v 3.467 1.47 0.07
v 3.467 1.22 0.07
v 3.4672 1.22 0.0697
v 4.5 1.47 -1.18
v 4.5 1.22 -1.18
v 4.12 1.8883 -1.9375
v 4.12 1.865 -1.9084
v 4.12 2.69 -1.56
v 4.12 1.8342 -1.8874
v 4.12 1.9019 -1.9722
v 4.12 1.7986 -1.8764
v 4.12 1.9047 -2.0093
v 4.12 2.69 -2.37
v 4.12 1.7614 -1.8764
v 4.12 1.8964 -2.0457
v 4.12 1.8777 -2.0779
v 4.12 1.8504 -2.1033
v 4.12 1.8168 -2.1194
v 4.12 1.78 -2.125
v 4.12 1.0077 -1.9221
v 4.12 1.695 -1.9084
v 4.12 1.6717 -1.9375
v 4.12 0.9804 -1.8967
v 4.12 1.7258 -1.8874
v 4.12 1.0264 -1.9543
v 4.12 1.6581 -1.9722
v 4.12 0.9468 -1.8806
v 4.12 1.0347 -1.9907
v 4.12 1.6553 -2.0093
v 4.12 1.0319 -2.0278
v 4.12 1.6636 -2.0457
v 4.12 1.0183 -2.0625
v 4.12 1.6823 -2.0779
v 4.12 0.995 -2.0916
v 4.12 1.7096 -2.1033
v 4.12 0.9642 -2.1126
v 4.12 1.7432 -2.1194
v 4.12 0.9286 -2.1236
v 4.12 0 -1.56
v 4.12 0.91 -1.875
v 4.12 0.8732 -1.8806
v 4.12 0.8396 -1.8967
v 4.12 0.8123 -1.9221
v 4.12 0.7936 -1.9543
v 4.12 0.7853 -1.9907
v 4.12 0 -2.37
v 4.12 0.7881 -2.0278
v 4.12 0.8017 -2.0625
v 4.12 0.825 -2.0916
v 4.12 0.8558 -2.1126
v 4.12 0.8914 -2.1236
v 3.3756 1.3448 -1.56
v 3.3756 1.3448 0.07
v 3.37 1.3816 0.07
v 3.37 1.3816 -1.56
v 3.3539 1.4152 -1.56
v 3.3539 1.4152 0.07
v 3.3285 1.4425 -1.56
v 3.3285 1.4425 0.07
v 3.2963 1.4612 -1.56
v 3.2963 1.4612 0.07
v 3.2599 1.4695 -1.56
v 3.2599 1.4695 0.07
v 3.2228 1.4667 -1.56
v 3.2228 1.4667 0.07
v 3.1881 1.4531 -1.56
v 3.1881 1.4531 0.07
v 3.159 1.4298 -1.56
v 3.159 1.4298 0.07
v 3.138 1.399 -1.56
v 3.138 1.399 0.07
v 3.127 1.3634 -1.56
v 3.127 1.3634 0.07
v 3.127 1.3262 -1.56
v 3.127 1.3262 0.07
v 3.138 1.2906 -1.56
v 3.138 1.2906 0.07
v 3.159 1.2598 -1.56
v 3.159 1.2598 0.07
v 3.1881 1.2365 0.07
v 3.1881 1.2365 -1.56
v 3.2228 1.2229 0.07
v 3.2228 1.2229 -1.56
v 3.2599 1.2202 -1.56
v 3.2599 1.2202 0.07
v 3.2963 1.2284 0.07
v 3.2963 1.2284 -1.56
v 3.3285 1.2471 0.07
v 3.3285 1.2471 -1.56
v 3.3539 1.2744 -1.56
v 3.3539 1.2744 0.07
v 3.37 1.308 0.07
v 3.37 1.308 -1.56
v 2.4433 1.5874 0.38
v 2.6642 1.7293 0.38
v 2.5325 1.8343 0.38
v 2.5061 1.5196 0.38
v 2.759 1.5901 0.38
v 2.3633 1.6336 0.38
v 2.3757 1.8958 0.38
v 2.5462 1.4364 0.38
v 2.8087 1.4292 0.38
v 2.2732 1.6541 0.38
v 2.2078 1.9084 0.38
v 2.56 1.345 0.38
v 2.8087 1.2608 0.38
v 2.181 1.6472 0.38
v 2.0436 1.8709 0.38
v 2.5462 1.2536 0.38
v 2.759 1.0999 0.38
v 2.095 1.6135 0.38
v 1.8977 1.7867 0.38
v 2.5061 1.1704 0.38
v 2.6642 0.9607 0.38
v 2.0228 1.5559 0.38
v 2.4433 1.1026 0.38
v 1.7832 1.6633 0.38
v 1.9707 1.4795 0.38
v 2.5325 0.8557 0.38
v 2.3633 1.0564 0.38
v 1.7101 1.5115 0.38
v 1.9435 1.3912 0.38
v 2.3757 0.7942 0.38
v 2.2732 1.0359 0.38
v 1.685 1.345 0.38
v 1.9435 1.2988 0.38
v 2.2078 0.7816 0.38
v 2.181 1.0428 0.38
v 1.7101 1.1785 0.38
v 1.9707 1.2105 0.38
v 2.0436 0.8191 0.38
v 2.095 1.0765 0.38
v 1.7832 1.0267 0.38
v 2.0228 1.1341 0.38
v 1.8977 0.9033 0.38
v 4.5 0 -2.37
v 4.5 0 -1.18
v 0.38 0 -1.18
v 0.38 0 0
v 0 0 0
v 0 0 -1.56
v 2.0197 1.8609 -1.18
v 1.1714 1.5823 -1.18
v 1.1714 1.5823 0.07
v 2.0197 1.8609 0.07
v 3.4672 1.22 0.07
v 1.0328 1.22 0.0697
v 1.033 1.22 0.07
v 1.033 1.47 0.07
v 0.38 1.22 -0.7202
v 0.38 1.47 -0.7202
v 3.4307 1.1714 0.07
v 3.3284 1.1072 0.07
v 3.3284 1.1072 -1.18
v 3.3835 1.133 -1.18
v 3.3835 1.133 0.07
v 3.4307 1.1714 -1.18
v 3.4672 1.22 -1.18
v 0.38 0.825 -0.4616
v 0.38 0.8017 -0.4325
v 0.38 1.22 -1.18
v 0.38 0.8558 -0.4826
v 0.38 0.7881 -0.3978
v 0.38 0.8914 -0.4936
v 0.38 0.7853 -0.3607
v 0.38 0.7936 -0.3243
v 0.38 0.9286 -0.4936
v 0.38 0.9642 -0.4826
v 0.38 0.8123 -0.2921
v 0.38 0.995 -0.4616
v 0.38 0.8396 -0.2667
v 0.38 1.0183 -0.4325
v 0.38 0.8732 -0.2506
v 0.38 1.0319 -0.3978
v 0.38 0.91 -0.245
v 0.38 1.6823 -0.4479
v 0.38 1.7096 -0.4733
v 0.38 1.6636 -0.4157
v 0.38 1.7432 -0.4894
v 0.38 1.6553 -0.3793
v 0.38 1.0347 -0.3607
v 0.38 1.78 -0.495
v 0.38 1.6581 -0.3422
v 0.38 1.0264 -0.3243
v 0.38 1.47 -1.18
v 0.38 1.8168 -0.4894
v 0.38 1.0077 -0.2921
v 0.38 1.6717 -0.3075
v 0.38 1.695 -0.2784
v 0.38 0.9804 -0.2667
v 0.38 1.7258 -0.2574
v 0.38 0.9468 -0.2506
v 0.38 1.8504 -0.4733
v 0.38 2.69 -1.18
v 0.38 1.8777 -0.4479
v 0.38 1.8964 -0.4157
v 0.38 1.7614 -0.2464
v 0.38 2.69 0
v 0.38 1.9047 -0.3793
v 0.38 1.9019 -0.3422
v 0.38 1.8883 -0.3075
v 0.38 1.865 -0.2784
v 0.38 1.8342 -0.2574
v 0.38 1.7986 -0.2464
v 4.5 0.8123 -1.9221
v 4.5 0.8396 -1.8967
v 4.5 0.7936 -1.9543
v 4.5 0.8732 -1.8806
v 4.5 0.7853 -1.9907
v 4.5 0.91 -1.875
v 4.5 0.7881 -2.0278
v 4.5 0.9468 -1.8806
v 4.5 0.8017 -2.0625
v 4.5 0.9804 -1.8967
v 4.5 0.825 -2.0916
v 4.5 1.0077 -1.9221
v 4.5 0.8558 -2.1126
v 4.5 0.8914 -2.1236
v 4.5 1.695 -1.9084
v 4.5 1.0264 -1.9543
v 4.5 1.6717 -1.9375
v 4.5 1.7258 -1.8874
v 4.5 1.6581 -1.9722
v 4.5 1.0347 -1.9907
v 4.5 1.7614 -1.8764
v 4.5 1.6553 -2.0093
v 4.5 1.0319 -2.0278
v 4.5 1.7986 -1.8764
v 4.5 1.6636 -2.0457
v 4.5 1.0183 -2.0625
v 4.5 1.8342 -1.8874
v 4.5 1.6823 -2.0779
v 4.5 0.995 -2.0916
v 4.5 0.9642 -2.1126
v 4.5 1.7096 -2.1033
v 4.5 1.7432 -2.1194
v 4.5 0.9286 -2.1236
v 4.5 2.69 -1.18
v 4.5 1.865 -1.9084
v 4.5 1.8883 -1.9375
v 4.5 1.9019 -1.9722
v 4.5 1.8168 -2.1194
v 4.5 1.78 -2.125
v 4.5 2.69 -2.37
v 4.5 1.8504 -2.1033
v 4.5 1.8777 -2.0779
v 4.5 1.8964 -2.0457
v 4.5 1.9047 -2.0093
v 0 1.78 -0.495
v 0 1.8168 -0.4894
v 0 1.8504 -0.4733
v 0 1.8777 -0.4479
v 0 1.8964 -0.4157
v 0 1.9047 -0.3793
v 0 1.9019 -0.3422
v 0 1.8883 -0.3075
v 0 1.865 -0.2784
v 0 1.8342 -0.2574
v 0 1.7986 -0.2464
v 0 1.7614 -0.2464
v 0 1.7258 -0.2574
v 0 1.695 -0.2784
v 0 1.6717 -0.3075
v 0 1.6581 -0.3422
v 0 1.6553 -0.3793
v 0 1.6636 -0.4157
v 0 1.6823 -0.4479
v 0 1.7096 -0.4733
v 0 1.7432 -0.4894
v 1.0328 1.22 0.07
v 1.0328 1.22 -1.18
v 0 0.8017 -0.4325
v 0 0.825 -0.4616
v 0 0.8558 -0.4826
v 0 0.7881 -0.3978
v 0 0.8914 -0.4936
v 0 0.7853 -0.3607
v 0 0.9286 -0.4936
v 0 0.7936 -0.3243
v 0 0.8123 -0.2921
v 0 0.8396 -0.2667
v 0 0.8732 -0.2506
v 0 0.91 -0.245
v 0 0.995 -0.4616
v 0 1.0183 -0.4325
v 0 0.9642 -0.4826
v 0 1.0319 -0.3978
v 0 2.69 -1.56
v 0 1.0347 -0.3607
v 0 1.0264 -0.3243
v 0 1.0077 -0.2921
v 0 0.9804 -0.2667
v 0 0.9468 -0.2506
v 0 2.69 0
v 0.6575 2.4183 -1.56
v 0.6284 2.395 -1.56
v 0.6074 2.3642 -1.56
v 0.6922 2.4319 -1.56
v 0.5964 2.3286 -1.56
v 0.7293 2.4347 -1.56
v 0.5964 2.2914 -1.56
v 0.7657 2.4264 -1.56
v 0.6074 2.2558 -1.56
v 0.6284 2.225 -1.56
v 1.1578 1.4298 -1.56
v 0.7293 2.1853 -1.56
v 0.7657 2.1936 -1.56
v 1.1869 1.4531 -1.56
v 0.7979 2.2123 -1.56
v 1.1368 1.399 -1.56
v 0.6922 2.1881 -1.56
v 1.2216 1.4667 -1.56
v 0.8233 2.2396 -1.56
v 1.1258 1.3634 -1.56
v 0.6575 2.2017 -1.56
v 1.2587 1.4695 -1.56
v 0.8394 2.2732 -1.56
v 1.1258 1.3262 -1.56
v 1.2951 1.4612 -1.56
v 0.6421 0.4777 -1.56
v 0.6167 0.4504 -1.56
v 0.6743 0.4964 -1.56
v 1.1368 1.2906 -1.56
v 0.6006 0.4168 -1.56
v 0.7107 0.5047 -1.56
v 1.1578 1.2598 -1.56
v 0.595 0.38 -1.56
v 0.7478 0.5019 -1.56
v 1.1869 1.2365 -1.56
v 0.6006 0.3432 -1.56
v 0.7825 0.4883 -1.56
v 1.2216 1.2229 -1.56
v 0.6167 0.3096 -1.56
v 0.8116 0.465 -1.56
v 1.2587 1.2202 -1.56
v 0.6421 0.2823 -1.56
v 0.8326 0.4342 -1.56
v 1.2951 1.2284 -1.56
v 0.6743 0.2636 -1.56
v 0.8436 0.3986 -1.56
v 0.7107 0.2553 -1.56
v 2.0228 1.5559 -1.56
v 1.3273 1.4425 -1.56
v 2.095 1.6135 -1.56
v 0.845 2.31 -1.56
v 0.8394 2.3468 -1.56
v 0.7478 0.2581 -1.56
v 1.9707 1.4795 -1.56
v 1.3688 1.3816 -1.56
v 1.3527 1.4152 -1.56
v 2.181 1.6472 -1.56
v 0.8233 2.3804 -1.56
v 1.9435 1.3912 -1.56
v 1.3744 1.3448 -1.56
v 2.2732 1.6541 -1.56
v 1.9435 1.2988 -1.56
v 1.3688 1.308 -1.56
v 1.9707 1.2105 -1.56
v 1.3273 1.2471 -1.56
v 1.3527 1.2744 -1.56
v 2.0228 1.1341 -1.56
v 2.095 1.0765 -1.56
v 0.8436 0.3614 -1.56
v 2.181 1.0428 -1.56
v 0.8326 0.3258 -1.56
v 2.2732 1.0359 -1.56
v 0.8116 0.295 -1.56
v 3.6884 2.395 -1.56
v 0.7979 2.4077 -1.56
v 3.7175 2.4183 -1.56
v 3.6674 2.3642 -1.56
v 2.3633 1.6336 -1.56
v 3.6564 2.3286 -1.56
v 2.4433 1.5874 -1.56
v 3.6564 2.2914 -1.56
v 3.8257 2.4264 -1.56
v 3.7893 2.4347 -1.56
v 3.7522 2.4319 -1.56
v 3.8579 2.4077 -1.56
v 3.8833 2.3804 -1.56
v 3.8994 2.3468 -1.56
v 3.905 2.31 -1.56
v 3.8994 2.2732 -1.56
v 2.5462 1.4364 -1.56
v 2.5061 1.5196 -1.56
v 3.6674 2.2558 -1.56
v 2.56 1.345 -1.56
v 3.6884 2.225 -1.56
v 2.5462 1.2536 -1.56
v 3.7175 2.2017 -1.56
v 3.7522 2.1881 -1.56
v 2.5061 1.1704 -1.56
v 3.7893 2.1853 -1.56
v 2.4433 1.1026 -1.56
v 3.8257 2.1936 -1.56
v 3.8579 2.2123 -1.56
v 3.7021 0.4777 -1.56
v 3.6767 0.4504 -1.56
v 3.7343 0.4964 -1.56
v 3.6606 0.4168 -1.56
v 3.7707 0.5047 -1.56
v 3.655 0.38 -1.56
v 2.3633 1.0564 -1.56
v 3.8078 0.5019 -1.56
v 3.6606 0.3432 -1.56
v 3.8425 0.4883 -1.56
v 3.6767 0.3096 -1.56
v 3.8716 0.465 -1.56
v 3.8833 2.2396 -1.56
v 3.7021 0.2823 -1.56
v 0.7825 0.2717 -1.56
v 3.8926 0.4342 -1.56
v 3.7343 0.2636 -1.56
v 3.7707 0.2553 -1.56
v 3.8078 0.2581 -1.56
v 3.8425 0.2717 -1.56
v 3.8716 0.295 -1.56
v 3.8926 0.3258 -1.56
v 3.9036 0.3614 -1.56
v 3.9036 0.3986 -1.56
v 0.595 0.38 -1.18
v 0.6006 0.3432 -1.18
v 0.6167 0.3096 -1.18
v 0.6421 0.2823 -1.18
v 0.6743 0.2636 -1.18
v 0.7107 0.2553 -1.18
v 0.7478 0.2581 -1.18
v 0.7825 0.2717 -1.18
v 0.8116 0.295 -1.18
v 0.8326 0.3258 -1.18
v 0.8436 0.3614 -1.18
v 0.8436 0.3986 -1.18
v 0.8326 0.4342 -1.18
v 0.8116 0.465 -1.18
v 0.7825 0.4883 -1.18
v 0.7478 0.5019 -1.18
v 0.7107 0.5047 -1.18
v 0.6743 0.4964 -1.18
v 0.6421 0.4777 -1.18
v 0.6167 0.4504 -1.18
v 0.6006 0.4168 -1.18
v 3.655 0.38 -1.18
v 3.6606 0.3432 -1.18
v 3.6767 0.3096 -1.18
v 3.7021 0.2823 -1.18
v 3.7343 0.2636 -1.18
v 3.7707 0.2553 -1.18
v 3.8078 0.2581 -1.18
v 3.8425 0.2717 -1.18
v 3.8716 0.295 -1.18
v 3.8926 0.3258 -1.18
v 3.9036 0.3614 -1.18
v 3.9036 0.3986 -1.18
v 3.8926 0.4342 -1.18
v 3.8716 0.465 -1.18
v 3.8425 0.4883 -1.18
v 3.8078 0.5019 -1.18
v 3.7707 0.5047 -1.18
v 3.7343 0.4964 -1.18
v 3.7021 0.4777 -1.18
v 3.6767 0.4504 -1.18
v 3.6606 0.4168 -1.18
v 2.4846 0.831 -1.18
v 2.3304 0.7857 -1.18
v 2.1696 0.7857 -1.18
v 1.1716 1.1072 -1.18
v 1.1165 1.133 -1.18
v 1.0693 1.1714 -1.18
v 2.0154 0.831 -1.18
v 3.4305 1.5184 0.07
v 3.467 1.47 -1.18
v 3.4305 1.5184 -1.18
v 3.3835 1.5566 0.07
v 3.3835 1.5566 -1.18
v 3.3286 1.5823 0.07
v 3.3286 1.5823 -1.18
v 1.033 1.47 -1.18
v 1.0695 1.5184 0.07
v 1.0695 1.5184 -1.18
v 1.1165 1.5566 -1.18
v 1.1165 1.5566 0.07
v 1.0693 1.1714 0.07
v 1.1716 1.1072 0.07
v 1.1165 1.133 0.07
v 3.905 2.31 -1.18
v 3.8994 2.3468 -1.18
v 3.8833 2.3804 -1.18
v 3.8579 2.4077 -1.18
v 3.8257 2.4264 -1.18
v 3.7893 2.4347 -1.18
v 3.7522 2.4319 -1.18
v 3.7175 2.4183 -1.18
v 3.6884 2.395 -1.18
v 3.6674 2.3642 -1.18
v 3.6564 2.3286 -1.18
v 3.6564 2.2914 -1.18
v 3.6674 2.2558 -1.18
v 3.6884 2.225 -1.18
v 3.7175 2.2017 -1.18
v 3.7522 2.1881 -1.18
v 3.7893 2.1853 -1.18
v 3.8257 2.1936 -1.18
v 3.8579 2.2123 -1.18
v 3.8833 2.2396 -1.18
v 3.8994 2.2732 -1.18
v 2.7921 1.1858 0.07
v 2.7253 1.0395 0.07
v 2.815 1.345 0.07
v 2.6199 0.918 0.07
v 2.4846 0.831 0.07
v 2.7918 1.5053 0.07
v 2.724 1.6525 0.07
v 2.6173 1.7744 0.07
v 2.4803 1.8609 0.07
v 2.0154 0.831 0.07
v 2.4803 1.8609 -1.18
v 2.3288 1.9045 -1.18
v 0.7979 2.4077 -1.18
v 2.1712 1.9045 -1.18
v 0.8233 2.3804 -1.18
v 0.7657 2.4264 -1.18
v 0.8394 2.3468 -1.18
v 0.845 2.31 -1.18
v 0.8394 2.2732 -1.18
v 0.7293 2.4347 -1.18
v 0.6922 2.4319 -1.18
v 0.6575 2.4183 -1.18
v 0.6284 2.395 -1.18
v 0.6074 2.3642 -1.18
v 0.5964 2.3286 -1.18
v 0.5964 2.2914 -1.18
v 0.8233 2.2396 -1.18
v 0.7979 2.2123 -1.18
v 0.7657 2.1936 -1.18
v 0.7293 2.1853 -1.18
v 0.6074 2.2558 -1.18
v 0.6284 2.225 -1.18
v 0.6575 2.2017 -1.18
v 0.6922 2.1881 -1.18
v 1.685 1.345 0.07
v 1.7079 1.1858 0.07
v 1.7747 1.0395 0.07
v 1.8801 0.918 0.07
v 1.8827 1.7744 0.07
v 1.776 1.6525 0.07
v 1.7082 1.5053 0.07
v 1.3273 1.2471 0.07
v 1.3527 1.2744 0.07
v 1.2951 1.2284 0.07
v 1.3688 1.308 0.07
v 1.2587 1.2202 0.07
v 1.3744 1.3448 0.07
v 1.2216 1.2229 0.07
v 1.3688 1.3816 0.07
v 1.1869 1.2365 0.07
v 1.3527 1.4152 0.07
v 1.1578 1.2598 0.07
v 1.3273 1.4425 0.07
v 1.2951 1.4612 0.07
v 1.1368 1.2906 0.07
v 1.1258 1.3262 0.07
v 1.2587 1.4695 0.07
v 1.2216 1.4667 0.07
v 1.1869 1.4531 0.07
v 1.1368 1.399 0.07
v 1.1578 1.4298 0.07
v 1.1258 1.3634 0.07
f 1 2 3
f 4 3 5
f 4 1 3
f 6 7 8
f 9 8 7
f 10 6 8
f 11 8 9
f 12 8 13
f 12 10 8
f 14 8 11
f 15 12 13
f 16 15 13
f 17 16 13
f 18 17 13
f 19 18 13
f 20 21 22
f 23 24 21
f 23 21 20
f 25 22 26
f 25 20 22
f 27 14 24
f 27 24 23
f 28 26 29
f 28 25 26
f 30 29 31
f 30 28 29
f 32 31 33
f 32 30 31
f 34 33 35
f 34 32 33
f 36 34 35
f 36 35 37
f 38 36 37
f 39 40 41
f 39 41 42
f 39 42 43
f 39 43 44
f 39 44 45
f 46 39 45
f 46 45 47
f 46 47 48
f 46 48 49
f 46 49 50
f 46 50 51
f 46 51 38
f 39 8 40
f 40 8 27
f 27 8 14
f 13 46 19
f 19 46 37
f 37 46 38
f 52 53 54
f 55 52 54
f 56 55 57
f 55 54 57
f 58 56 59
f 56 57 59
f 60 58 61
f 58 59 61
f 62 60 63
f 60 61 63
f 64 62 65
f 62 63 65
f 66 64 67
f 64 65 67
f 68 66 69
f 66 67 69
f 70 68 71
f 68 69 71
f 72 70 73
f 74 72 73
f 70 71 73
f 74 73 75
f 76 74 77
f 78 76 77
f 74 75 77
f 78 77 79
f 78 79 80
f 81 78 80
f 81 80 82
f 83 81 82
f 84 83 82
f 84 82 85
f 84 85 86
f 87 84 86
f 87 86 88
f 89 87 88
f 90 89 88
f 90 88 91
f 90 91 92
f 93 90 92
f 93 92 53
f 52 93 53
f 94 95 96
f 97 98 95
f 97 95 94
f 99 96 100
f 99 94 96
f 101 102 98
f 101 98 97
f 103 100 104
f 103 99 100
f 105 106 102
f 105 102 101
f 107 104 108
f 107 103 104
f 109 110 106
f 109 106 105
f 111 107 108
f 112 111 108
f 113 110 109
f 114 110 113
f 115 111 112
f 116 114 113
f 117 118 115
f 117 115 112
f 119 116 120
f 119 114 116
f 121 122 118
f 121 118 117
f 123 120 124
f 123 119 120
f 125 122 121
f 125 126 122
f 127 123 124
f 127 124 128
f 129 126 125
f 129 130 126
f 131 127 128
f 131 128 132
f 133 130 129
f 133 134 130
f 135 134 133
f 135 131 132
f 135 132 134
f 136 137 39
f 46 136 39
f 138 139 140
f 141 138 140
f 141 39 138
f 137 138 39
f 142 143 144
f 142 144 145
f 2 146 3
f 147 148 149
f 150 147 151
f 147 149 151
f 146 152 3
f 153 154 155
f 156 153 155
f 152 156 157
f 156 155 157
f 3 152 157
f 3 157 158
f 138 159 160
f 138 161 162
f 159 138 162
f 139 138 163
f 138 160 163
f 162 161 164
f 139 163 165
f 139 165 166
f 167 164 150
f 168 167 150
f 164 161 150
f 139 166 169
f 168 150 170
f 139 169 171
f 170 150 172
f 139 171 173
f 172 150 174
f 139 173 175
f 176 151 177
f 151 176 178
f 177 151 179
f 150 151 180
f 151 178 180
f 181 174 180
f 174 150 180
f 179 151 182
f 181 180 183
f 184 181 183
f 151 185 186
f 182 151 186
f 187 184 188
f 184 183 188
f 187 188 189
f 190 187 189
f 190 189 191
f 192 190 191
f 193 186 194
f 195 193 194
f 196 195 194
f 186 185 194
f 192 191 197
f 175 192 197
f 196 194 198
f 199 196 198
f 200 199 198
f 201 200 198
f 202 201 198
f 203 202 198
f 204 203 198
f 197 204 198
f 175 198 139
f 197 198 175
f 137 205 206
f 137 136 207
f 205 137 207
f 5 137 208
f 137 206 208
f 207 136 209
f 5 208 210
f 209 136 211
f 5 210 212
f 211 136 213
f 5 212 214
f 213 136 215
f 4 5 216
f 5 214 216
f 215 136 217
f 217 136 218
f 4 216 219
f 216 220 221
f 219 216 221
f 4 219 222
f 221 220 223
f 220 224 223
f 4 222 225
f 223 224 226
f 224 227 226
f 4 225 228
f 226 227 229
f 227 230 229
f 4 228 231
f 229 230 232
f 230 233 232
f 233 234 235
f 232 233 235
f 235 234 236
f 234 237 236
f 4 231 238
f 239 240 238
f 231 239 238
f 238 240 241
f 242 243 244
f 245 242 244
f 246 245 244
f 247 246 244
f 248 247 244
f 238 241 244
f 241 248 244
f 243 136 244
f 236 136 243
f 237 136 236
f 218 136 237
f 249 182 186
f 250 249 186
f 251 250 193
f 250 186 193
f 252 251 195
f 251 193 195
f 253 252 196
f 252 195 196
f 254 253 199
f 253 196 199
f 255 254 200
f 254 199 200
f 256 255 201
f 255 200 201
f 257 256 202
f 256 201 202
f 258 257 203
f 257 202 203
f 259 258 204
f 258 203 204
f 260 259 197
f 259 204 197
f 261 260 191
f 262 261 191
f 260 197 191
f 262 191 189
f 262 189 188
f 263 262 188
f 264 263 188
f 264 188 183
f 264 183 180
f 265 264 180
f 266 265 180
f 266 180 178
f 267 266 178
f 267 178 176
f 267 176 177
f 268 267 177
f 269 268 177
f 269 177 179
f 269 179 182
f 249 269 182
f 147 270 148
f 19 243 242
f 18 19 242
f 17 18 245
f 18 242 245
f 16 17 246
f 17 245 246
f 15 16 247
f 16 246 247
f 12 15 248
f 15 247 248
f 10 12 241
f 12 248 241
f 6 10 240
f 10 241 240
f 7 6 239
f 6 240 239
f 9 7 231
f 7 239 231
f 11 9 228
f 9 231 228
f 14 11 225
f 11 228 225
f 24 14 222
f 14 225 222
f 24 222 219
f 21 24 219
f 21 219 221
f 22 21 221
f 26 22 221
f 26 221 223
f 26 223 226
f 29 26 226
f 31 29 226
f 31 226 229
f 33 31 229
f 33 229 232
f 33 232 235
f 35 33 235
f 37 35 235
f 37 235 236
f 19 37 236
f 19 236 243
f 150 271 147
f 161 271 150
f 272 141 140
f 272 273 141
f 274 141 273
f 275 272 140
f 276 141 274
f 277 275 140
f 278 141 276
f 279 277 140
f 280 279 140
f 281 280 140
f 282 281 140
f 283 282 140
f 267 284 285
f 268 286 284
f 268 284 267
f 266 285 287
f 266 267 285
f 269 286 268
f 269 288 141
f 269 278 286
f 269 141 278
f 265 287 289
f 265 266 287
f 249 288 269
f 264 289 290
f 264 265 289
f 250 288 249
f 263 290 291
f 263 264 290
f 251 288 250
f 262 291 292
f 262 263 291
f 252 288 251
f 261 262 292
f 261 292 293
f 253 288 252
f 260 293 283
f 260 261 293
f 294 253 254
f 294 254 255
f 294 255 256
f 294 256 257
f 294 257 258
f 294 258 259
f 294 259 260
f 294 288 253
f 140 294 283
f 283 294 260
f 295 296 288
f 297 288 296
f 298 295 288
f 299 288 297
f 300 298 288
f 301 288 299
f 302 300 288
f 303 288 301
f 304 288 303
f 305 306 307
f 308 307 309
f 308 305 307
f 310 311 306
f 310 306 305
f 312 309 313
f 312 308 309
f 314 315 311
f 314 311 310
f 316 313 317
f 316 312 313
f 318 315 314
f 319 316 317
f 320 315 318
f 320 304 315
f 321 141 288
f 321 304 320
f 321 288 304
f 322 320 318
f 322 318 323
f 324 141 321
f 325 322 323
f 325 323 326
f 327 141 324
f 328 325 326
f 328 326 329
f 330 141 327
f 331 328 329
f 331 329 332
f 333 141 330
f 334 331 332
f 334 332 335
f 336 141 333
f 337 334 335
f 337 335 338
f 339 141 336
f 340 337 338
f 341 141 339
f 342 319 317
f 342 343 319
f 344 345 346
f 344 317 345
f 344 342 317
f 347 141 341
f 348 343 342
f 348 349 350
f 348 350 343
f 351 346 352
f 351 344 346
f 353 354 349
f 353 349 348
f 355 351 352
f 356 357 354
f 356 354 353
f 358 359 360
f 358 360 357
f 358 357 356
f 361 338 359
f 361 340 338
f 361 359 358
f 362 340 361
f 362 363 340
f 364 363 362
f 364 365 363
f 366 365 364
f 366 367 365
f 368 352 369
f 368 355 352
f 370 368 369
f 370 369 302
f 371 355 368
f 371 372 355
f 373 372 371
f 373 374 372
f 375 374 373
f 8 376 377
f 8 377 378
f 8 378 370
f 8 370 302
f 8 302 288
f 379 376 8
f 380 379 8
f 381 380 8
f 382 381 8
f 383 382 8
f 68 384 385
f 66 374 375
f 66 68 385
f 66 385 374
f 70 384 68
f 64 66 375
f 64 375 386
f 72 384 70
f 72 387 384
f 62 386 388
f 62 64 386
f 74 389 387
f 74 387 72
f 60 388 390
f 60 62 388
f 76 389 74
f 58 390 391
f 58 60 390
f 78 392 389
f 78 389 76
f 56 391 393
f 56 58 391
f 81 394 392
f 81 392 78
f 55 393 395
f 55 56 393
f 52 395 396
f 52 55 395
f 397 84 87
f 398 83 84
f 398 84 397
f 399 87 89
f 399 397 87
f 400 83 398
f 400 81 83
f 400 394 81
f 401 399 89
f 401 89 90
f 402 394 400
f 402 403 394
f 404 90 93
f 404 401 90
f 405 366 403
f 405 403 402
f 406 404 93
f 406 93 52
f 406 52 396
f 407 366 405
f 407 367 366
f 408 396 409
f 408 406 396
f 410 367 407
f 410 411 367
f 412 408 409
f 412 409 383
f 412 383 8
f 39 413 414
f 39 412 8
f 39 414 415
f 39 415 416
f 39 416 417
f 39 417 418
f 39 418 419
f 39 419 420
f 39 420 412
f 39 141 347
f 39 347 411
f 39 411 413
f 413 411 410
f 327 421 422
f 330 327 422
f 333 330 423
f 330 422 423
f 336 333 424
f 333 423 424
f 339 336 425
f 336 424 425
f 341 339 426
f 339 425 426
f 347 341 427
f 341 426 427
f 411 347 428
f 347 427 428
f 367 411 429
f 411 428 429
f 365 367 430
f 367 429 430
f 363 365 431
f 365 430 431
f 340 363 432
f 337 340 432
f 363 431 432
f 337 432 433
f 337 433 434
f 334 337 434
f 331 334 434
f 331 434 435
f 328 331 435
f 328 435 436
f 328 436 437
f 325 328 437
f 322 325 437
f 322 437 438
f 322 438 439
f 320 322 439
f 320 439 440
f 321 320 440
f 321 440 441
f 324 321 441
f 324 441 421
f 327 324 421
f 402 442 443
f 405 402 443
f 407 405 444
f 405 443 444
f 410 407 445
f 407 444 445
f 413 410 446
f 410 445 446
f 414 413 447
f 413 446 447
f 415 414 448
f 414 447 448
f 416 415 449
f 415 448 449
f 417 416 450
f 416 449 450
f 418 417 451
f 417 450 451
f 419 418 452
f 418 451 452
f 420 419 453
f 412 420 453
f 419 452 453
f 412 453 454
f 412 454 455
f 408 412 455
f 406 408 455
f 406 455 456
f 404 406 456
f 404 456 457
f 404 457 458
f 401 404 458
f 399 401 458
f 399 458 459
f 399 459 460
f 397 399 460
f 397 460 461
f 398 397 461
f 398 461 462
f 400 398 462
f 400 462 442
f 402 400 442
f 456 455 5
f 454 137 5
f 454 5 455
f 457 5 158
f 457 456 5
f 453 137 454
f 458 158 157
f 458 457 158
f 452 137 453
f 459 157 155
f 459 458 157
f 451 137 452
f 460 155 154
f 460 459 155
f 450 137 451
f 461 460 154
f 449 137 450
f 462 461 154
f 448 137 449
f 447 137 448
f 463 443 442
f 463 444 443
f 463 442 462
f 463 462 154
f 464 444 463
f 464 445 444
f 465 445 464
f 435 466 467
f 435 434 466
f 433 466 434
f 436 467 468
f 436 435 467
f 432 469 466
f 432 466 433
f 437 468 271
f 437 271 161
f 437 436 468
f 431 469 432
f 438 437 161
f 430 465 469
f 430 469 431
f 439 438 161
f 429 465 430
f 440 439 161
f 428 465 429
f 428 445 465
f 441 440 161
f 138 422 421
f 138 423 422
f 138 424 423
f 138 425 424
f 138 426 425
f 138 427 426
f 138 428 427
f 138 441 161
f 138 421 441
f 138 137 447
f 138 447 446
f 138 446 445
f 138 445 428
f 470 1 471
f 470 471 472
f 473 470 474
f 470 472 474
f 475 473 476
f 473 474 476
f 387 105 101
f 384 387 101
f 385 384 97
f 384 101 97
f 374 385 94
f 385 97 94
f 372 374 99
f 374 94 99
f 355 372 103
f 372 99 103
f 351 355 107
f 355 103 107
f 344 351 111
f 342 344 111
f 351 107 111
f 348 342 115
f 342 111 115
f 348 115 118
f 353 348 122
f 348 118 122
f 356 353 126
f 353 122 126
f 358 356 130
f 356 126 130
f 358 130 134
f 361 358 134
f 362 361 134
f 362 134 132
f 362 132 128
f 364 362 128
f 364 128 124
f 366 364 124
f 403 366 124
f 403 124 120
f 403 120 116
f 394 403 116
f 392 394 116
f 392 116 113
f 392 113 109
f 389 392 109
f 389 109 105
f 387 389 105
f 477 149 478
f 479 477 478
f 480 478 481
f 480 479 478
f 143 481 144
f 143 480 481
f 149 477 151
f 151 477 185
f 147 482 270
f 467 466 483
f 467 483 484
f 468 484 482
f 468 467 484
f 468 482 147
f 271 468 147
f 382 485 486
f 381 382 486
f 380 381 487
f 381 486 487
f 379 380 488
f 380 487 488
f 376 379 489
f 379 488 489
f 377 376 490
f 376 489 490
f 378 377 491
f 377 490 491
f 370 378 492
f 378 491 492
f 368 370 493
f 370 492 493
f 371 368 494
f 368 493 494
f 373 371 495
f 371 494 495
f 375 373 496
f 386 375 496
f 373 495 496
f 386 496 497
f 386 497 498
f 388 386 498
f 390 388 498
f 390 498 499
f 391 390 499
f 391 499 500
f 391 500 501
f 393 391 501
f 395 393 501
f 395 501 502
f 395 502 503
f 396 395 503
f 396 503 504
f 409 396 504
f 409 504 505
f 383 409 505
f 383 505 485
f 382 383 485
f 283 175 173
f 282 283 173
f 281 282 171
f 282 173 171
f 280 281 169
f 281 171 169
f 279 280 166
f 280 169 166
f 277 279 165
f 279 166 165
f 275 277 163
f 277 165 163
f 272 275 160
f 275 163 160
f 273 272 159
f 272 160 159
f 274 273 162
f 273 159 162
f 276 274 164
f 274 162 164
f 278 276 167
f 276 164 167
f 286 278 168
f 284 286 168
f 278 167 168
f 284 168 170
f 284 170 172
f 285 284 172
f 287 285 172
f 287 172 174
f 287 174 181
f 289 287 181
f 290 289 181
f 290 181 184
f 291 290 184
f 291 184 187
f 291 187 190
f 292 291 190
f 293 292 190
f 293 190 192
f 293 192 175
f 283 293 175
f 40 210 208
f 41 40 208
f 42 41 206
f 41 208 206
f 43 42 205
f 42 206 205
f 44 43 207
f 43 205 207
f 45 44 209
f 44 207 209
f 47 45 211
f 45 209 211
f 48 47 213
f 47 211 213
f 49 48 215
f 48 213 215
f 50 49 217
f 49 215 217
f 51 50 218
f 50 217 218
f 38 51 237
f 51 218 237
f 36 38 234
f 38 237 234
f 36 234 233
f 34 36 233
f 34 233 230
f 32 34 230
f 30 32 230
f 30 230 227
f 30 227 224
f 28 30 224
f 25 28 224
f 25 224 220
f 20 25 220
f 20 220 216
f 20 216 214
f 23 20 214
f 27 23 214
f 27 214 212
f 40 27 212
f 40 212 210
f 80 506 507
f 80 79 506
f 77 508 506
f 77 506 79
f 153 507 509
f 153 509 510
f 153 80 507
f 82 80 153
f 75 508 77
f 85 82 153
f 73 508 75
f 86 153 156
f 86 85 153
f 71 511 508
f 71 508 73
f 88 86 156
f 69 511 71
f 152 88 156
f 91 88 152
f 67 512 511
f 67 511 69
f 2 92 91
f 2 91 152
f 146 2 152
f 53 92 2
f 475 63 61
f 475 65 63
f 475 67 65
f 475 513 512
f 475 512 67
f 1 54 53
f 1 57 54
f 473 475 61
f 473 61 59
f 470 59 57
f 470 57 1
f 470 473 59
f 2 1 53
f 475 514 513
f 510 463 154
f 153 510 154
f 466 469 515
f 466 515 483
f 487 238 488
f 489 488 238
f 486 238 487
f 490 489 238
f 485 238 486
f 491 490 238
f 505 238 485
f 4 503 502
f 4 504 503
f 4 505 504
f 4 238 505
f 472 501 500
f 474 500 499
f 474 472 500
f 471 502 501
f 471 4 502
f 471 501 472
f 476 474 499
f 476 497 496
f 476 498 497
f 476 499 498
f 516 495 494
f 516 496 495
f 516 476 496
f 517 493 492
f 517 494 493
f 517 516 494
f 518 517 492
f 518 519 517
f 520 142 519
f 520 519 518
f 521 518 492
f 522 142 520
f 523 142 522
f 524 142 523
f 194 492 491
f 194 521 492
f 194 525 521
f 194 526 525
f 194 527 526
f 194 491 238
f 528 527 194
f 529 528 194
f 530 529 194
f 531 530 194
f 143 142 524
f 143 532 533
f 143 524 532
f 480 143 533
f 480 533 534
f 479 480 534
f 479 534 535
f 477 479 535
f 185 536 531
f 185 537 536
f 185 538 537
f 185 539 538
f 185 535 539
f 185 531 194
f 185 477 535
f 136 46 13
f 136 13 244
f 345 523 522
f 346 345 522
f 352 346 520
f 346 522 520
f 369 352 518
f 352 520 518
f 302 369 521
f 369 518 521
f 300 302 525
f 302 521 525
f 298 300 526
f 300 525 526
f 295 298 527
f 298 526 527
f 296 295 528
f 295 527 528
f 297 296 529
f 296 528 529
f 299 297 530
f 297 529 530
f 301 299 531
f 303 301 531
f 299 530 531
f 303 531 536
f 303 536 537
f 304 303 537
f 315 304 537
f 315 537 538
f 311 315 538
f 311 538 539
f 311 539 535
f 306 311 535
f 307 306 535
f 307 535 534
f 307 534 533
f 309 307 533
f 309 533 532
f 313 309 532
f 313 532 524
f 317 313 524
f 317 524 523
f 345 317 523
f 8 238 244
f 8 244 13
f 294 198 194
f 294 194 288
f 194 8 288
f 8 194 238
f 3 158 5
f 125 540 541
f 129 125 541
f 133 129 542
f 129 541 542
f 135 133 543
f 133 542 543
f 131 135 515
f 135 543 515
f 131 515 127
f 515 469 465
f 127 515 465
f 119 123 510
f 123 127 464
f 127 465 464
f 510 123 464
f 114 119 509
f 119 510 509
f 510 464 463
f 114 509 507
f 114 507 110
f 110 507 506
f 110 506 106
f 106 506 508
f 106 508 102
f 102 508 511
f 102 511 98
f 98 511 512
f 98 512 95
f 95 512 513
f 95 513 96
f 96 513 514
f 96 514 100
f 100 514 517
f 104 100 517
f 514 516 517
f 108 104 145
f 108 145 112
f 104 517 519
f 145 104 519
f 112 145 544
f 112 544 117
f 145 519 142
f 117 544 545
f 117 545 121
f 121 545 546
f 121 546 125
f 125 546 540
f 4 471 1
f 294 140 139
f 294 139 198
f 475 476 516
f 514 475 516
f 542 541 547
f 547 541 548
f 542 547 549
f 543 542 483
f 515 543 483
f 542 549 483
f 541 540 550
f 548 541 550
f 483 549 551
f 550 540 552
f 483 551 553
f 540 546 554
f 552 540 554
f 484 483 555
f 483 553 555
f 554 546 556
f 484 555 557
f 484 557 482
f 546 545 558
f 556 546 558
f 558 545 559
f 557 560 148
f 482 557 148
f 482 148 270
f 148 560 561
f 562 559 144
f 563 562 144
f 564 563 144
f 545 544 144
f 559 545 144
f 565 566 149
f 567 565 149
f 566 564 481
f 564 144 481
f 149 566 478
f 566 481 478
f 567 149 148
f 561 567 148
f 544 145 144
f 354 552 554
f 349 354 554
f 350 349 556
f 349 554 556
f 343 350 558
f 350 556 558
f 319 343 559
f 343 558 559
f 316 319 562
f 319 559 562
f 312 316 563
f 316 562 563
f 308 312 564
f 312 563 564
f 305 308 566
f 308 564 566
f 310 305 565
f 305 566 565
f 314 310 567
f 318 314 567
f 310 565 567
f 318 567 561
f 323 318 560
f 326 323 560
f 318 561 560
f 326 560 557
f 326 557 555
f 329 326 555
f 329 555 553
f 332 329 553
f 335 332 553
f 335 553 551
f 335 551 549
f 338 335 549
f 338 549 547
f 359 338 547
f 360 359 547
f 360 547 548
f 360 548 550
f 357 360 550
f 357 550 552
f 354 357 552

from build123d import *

# Parameters (mm, degrees)
BOSS_EXTRUDE1_DEPTH  = 2.69
SKETCH3_R            = 0.125
CUT_EXTRUDE2_DEPTH   = 10
SKETCH5_R            = 0.125
CUT_EXTRUDE4_DEPTH   = 10
SKETCH2_R            = 0.125
CUT_EXTRUDE5_DEPTH   = 10
SKETCH6_R            = 0.565
BOSS_EXTRUDE2_DEPTH  = 1.56
SKETCH8_R            = 0.31
CUT_EXTRUDE6_DEPTH   = 10
BOSS_EXTRUDE7_DEPTH  = 1.25
SKETCH22_R           = 0.125
CUT_EXTRUDE8_DEPTH   = 10
SKETCH23_R           = 0.125
CUT_EXTRUDE9_DEPTH   = 10
SKETCH25_W           = 1.099767666
SKETCH25_H           = 0.25
BOSS_EXTRUDE8_DEPTH  = 1.25
CUT_EXTRUDE13_DEPTH  = 0.25
SKETCH30_W           = 1.18
SKETCH30_H           = 0.25
BOSS_EXTRUDE10_DEPTH = 0.38


with BuildPart() as part:
    # Sketch1 → Boss-Extrude1 (new body)
    with BuildSketch(Plane(origin=(0, 0, 0), x_dir=(1, 0, 0), z_dir=(0, 1, 0))):
        Polygon((0, 0), (0, 1.56), (4.12, 1.56), (4.12, 2.37), (4.5, 2.37), (4.5, 1.18), (0.38, 1.18), (0.38, 0), align=None)
    extrude(amount=BOSS_EXTRUDE1_DEPTH)

    # Sketch3 → Cut-Extrude2 (cut)
    with BuildSketch(Plane(origin=(4.5, 0, 0), x_dir=(0, 0, -1), z_dir=(1, 0, 0))):
        with Locations((2, 1.78)):
            Circle(SKETCH3_R)
        with Locations(Location((2, 0.91, 0), (0, 0, 180))):
            Circle(SKETCH3_R)
    extrude(amount=-CUT_EXTRUDE2_DEPTH, mode=Mode.SUBTRACT)

    # Sketch5 → Cut-Extrude4 (cut)
    with BuildSketch(Plane(origin=(0.38, 0, 0), x_dir=(0, 0, -1), z_dir=(1, 0, 0))):
        with Locations((0.37, 1.78)):
            Circle(SKETCH5_R)
        with Locations(Location((0.37, 0.91, 0), (0, 0, 180))):
            Circle(SKETCH5_R)
    extrude(amount=-CUT_EXTRUDE4_DEPTH, mode=Mode.SUBTRACT)

    # Sketch2 → Cut-Extrude5 (cut)
    with BuildSketch(Plane.XY.offset(-1.18)):
        with Locations((3.78, 2.31)):
            Circle(SKETCH2_R)
        with Locations(Location((3.78, 0.38, 0), (0, 0, 180))):
            Circle(SKETCH2_R)
        with Locations((0.72, 2.31)):
            Circle(SKETCH2_R)
        with Locations(Location((0.72, 0.38, 0), (0, 0, 180))):
            Circle(SKETCH2_R)
    extrude(amount=-CUT_EXTRUDE5_DEPTH, mode=Mode.SUBTRACT)

    # Sketch6 → Boss-Extrude2 (add)
    with BuildSketch(Plane.XY.offset(-1.18)):
        with Locations(Location((2.25, 1.345, 0), (0, 0, 180))):
            Circle(SKETCH6_R)
    extrude(amount=BOSS_EXTRUDE2_DEPTH)

    # Sketch8 → Cut-Extrude6 (cut)
    with BuildSketch(Plane.XY.offset(0.38)):
        with Locations((2.25, 1.345)):
            Circle(SKETCH8_R)
    extrude(amount=-CUT_EXTRUDE6_DEPTH, mode=Mode.SUBTRACT)

    # Sketch14 → Boss-Extrude7 (add)
    with BuildSketch(Plane.XY.offset(-1.18)):
        with BuildLine():
            Line((3.328608678, 1.582320566), (2.480315468, 1.860926143))
            ThreePointArc((2.480315468, 1.860926143), (2.724000654, 1.652487204), (2.815, 1.345))
            ThreePointArc((2.815, 1.345), (2.725283564, 1.039499535), (2.484626428, 0.831020001))
            Line((2.484626428, 0.831020001), (3.328373597, 1.107207799))
            ThreePointArc((3.328373597, 1.107207799), (3.500600483, 1.344679025), (3.328608678, 1.582320566))
        make_face()
    boss_extrude7 = extrude(amount=BOSS_EXTRUDE7_DEPTH)

    # Mirror2: Boss-Extrude7 across plane
    add(boss_extrude7.mirror(Plane.ZY.offset(-2.25)))

    # Sketch22 → Cut-Extrude8 (cut)
    with BuildSketch(Plane.XY.offset(0.07)):
        with Locations((3.250600514, 1.344802722)):
            Circle(SKETCH22_R)
    extrude(amount=-CUT_EXTRUDE8_DEPTH, mode=Mode.SUBTRACT)

    # Sketch23 → Cut-Extrude9 (cut)
    with BuildSketch(Plane.XY.offset(0.07)):
        with Locations((1.249399486, 1.344802722)):
            Circle(SKETCH23_R)
    extrude(amount=-CUT_EXTRUDE9_DEPTH, mode=Mode.SUBTRACT)

    # Sketch25 → Boss-Extrude8 (add)
    with BuildSketch(Plane.XY.offset(-1.18)):
        with Locations((3.950116167, 1.345)):
            Rectangle(SKETCH25_W, SKETCH25_H)
    boss_extrude8 = extrude(amount=BOSS_EXTRUDE8_DEPTH)

    # Mirror3: Boss-Extrude8 across plane
    add(boss_extrude8.mirror(Plane.ZY.offset(-2.25)))

    # Sketch27 → Cut-Extrude13 (cut)
    with BuildSketch(Plane(origin=(0, 1.47, 0), x_dir=(1, 0, 0), z_dir=(0, 1, 0))):
        Polygon((3.466992847, -0.07), (4.5, 1.18), (4.5, -0.07), align=None)
    cut_extrude13 = extrude(amount=-CUT_EXTRUDE13_DEPTH, mode=Mode.SUBTRACT)

    # Mirror4: Cut-Extrude13 across plane
    add(cut_extrude13.mirror(Plane.ZY.offset(-2.25)), mode=Mode.SUBTRACT)

    # Sketch30 → Boss-Extrude10 (add)
    with BuildSketch(Plane.ZY):
        with Locations((-0.59, 1.345)):
            Rectangle(SKETCH30_W, SKETCH30_H)
    extrude(amount=-BOSS_EXTRUDE10_DEPTH)


solid = part.part
